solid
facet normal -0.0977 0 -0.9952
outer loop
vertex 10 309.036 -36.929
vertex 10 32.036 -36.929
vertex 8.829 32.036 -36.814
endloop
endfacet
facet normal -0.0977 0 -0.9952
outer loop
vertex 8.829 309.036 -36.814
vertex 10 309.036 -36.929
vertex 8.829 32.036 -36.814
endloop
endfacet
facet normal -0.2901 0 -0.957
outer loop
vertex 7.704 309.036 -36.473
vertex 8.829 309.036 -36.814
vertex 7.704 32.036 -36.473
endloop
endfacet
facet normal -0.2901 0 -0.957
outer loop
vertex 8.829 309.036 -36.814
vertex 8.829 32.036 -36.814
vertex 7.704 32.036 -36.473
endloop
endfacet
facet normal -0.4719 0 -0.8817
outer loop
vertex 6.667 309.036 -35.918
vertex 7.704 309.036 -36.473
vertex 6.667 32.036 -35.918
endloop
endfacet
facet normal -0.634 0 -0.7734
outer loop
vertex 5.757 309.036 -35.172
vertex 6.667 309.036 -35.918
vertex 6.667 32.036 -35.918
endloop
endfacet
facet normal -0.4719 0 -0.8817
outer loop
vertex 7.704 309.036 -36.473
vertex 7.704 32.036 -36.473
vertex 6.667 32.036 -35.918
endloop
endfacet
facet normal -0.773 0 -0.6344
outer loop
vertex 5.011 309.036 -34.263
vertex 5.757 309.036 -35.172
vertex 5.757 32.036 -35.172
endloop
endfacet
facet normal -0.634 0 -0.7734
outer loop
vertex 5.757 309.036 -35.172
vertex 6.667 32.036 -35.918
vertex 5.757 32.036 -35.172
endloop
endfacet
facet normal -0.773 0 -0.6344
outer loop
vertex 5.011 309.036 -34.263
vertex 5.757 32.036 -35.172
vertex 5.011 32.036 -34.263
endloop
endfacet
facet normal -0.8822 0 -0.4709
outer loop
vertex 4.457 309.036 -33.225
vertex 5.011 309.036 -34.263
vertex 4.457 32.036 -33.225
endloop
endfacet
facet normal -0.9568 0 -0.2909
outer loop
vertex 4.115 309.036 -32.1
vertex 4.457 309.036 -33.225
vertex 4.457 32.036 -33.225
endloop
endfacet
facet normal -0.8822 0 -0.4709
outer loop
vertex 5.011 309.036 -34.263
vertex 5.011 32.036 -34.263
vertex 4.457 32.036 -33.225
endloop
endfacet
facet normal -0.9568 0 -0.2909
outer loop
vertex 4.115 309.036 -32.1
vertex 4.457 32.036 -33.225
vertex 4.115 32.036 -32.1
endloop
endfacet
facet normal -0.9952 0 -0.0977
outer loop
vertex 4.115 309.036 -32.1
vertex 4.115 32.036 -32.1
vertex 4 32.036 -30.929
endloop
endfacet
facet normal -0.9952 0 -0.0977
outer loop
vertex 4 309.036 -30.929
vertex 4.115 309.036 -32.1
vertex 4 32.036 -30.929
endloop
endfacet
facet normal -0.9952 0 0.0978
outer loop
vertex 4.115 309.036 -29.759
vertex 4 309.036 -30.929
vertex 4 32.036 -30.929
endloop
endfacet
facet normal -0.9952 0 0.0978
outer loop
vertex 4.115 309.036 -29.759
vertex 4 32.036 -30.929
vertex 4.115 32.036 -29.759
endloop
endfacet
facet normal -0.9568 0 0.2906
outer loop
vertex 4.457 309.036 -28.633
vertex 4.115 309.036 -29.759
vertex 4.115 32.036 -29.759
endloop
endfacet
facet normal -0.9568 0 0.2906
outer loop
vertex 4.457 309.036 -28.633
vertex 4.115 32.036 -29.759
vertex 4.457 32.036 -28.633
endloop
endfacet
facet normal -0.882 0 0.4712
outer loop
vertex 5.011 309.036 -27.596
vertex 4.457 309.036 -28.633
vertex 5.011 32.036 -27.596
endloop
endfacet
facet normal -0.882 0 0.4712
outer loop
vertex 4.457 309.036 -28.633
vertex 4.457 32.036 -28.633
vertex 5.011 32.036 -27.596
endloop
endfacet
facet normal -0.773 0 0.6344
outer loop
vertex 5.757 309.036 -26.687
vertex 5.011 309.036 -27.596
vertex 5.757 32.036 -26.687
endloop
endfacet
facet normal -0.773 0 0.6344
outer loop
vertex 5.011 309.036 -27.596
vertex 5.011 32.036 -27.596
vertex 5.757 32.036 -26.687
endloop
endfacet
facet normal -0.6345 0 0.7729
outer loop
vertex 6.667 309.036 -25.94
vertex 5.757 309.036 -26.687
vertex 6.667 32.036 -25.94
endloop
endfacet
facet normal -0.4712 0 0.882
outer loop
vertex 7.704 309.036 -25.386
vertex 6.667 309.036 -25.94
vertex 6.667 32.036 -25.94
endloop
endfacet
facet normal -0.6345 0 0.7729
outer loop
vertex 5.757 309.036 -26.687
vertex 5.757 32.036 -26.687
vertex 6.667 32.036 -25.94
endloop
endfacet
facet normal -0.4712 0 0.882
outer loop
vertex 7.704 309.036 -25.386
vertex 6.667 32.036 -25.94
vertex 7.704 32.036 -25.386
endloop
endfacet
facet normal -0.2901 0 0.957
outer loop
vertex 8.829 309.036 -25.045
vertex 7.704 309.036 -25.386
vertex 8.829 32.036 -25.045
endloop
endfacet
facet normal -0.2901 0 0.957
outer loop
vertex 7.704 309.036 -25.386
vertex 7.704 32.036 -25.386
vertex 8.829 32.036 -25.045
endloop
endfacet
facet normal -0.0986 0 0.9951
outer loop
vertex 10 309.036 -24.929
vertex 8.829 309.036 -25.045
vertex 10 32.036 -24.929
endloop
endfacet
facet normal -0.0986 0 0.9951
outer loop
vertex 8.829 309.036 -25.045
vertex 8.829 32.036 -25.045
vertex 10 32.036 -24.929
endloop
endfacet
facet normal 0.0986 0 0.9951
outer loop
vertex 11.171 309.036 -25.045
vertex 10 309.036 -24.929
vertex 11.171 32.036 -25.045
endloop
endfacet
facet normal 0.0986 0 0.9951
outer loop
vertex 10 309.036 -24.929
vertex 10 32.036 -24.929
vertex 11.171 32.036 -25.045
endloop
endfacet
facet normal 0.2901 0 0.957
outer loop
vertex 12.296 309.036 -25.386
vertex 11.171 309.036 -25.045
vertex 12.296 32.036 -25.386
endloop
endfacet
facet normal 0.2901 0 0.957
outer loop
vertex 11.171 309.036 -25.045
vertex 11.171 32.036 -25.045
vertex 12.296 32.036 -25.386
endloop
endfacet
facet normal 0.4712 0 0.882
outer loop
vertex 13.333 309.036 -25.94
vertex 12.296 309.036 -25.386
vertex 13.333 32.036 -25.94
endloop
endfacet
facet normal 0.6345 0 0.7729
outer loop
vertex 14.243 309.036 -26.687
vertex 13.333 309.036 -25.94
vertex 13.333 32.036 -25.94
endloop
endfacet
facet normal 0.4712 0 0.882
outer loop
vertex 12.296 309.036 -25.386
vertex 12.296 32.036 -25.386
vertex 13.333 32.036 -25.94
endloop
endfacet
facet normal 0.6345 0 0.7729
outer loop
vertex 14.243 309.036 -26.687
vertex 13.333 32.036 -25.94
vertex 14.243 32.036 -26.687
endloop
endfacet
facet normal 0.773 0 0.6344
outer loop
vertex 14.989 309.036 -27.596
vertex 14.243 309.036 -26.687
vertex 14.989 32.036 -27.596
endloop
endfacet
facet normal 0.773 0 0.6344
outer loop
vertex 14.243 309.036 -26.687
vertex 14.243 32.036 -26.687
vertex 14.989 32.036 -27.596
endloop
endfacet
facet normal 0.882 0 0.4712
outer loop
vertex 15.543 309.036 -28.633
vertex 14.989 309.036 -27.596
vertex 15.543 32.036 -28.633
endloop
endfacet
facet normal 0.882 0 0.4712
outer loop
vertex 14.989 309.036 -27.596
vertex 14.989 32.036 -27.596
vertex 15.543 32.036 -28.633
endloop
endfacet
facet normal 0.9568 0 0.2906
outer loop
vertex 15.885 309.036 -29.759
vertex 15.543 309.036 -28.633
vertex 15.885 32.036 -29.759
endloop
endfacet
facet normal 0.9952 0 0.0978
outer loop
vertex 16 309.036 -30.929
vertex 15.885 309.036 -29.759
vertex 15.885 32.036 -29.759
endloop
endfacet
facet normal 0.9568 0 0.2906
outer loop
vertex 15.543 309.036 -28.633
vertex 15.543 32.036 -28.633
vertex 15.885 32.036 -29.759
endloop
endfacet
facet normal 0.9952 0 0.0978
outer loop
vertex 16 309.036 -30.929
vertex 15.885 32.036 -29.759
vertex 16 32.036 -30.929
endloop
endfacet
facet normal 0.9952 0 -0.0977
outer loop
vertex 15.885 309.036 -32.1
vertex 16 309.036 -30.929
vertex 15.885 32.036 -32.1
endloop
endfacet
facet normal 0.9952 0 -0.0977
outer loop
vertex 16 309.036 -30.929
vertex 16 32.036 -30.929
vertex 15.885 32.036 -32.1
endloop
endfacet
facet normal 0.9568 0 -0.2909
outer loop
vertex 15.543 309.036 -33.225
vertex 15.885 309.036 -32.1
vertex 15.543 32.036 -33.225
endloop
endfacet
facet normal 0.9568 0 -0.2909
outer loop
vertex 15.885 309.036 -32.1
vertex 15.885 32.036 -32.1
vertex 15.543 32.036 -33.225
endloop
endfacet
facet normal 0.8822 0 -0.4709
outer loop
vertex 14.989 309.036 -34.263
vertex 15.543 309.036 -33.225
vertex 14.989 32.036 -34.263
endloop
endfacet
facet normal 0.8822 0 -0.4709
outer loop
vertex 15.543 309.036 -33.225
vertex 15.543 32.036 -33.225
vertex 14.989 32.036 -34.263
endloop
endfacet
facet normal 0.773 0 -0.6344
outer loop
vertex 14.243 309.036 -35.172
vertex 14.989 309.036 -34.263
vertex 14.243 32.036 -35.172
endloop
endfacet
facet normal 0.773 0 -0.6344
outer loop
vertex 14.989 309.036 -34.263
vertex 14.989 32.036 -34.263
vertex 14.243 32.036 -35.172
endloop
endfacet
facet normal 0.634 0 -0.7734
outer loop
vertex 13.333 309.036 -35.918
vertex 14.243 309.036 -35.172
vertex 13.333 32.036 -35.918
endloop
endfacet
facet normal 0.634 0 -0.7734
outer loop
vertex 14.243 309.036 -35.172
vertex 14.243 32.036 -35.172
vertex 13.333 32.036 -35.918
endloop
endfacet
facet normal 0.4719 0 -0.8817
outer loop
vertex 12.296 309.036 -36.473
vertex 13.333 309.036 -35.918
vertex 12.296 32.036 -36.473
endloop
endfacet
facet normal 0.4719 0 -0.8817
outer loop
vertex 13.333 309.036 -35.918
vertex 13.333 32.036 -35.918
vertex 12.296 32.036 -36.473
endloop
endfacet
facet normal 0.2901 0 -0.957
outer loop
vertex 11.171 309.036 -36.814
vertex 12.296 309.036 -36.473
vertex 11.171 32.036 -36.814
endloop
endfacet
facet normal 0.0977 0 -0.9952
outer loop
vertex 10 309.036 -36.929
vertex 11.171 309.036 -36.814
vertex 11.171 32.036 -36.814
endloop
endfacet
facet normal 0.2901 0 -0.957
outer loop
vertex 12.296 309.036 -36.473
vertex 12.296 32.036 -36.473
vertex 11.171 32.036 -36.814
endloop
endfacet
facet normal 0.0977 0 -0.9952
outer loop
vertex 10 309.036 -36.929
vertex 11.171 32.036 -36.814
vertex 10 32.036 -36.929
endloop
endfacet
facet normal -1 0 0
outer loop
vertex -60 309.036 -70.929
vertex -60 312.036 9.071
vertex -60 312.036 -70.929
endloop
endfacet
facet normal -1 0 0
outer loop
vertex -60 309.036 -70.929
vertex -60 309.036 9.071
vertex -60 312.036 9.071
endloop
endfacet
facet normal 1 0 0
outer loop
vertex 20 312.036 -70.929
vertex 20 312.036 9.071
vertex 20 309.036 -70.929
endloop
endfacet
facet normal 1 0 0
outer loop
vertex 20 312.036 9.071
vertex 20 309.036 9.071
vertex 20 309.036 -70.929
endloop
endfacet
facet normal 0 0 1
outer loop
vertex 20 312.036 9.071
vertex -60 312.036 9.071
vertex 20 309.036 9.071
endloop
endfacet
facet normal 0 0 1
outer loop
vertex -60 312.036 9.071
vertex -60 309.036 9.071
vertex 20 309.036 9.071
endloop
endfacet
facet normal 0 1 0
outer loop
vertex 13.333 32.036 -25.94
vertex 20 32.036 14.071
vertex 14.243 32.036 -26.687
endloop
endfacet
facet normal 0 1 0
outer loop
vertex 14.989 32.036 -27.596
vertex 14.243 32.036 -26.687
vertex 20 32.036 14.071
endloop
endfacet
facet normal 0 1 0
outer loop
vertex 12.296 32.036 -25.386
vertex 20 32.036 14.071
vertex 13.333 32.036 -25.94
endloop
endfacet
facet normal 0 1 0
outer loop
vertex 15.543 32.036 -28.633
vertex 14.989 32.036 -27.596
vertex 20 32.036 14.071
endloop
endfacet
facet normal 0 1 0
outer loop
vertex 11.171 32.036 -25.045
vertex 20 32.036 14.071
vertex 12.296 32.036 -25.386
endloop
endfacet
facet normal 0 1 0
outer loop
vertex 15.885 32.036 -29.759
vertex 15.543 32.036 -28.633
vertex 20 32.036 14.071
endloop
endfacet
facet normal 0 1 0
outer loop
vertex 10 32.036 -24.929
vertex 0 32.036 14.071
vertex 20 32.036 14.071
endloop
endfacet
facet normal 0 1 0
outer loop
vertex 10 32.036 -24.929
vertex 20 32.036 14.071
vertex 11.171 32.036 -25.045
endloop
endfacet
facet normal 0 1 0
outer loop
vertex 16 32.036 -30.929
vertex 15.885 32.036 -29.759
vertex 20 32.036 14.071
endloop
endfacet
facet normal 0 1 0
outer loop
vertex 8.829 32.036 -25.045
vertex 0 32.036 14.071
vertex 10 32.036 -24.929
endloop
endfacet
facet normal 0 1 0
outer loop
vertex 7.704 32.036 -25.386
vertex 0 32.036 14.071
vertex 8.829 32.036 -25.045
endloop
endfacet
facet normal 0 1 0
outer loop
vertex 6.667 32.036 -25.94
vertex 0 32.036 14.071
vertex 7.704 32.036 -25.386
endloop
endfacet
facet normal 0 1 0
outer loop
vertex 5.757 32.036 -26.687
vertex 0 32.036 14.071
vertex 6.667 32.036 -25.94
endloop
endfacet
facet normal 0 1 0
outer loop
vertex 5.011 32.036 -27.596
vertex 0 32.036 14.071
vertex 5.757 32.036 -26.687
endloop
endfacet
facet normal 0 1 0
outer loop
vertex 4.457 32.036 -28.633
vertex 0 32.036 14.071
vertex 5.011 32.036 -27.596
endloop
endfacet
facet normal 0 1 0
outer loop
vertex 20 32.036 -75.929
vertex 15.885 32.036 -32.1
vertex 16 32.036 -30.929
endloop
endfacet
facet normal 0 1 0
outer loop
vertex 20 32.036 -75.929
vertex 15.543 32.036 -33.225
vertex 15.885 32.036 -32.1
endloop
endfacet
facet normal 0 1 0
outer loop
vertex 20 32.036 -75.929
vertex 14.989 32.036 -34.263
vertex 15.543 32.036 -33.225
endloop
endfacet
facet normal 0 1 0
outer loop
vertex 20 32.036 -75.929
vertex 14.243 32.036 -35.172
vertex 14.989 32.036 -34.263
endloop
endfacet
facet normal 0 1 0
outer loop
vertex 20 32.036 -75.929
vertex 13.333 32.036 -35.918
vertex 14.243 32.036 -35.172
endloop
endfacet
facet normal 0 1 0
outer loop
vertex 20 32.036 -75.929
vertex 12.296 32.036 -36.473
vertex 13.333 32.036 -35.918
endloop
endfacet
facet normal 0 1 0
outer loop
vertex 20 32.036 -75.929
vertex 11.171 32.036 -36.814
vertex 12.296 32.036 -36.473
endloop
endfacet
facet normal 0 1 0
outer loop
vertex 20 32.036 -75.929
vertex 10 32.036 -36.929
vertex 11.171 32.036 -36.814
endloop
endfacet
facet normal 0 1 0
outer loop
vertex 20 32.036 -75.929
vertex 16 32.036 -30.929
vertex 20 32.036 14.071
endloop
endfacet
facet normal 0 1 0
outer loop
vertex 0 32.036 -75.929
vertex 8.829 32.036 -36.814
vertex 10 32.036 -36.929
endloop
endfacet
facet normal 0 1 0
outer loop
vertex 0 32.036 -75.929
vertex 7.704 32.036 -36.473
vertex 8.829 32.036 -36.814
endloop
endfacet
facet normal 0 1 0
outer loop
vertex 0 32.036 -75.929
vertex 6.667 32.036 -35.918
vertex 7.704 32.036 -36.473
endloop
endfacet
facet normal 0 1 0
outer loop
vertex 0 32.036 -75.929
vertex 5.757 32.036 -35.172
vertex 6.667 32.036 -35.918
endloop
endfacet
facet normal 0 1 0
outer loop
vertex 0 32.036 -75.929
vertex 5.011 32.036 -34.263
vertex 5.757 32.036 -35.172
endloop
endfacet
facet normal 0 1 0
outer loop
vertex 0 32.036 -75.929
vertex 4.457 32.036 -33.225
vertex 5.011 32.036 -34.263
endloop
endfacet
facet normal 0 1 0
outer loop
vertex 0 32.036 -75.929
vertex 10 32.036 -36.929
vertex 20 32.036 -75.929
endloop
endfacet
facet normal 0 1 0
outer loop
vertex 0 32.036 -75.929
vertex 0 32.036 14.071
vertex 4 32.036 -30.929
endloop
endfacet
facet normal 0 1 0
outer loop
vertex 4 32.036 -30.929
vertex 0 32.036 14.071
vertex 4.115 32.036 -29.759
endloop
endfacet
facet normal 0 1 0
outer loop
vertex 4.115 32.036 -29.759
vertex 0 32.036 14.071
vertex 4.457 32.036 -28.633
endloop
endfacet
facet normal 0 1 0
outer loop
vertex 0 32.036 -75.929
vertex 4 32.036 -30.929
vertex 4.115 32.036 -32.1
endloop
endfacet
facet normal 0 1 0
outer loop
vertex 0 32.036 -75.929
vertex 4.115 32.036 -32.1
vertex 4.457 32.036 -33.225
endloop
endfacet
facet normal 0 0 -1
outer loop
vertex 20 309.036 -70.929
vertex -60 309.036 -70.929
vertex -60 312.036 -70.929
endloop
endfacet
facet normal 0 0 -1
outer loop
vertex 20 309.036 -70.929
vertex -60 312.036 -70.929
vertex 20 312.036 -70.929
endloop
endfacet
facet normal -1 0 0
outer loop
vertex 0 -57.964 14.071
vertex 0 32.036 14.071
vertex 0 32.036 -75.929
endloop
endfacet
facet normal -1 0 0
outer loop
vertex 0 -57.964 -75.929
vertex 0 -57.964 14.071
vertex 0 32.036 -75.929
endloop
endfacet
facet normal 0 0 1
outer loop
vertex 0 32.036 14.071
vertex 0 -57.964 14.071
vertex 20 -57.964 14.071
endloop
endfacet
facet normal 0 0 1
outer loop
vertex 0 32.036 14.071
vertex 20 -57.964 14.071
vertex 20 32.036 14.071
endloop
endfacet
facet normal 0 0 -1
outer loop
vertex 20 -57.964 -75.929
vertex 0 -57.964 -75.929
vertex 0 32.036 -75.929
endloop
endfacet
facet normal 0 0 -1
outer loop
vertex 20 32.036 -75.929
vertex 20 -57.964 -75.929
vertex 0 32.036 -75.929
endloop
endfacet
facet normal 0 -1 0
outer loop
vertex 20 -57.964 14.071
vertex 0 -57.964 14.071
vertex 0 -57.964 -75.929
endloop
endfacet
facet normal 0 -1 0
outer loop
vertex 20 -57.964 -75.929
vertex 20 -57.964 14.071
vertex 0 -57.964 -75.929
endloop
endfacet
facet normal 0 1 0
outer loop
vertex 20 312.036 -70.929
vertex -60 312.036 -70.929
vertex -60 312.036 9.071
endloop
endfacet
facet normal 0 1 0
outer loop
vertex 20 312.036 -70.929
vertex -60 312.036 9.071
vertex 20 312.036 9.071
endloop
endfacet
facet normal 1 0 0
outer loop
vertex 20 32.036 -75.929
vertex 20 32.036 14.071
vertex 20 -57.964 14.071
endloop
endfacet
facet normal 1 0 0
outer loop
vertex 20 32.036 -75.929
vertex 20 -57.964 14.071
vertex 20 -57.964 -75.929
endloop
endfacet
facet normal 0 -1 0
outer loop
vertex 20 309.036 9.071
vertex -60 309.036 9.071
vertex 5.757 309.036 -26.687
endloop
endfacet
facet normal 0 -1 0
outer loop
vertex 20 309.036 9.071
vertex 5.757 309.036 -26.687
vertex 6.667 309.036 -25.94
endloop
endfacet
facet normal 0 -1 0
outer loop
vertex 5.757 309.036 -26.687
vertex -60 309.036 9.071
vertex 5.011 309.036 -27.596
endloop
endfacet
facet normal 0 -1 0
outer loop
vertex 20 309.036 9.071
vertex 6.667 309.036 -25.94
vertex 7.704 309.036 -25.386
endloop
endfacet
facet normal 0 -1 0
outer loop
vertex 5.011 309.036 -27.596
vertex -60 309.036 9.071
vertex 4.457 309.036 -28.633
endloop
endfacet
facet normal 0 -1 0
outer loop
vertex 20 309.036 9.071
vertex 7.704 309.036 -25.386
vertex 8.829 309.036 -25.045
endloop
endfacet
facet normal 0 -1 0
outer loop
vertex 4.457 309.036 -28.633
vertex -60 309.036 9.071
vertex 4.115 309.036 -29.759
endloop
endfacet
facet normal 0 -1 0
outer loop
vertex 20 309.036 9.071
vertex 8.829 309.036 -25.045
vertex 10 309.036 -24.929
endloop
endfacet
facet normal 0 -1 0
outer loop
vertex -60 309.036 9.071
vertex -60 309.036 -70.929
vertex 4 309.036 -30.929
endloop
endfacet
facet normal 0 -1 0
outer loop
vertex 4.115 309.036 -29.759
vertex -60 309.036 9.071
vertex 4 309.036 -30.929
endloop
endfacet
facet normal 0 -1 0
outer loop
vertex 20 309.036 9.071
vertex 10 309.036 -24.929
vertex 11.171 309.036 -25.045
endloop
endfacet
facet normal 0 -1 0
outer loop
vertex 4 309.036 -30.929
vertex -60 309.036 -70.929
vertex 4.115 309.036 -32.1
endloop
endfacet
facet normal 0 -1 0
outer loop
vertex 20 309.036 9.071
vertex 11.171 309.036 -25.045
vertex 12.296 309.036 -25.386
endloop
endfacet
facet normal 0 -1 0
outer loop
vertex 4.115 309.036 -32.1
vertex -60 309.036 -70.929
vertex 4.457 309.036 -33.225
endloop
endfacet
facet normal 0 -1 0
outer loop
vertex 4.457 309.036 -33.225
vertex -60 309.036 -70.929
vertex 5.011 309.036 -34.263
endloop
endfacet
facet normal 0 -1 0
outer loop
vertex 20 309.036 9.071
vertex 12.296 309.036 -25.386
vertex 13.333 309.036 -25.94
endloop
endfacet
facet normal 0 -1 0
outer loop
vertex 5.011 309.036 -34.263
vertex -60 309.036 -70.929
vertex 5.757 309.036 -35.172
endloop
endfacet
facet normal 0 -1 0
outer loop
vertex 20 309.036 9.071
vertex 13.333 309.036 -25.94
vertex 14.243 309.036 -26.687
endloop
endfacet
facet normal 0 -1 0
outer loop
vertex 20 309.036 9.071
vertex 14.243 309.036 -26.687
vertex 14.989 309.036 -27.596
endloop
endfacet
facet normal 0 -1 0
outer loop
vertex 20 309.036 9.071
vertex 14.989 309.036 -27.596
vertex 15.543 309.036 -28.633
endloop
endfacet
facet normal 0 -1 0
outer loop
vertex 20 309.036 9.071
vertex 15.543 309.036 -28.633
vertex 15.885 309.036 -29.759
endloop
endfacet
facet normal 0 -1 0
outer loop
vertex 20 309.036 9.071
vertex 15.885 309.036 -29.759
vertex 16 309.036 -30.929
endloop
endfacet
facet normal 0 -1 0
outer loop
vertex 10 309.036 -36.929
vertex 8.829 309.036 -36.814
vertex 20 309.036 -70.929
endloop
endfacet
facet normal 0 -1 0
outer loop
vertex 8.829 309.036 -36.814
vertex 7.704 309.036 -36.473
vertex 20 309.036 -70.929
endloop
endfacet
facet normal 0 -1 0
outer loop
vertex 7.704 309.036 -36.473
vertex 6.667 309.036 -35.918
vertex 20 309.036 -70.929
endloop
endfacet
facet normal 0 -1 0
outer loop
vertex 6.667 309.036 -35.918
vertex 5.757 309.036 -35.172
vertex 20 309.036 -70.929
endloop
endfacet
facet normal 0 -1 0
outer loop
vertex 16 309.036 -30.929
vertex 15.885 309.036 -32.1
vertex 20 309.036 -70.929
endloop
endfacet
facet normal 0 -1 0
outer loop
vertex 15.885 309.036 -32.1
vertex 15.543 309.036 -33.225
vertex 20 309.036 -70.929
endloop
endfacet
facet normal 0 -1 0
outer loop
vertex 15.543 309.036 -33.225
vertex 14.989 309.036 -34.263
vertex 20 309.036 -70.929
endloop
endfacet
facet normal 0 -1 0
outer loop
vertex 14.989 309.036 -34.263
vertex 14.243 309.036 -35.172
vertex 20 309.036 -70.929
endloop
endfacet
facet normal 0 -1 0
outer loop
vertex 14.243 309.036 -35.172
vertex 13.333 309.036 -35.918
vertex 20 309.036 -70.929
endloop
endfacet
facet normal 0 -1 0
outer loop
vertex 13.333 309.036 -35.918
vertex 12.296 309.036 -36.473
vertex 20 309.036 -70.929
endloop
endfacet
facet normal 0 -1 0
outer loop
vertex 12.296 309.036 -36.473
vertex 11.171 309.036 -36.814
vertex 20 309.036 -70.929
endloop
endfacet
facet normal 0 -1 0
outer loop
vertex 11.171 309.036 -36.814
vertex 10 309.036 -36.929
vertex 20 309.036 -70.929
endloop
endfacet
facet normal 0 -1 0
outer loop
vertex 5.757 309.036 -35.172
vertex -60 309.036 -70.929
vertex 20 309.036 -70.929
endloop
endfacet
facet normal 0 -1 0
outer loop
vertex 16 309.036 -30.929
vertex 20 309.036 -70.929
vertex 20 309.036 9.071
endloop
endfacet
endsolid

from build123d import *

# Parameters (mm, degrees)
ESQUISSE1_W        = 90
ESQUISSE1_H        = 90
BOSS_EXTRU_1_DEPTH = 20
ESQUISSE2_R        = 6
BOSS_EXTRU_2_DEPTH = 277
ESQUISSE3_W        = 80
ESQUISSE3_H        = 80
BOSS_EXTRU_3_DEPTH = 2.9
ESQUISSE4_W        = 80
ESQUISSE4_H        = 80
BOSS_EXTRU_4_DEPTH = 0.1


with BuildPart() as part:
    # Esquisse1 → Boss.-Extru.1 (new body)
    with BuildSketch(Plane(origin=(0, 0, 0), x_dir=(0, 0, -1), z_dir=(1, 0, 0))):
        with Locations((30.929303344, -12.964038863)):
            Rectangle(ESQUISSE1_W, ESQUISSE1_H)
    extrude(amount=BOSS_EXTRU_1_DEPTH)

    # Esquisse2 → Boss.-Extru.2 (add)
    with BuildSketch(Plane(origin=(0, 32.035961137, 0), x_dir=(1, 0, 0), z_dir=(0, 1, 0))):
        with Locations(Location((10, 30.929303344, 0), (0, 0, 90))):
            Circle(ESQUISSE2_R)
    extrude(amount=BOSS_EXTRU_2_DEPTH)

    # Esquisse3 → Boss.-Extru.3 (add)
    with BuildSketch(Plane(origin=(0, 309.035961137, 0), x_dir=(1, 0, 0), z_dir=(0, 1, 0))):
        with Locations((-20, 30.929303344)):
            Rectangle(ESQUISSE3_W, ESQUISSE3_H)
    extrude(amount=BOSS_EXTRU_3_DEPTH)

    # Esquisse4 → Boss.-Extru.4 (add)
    with BuildSketch(Plane(origin=(0, 311.935961137, 0), x_dir=(1, 0, 0), z_dir=(0, 1, 0))):
        with Locations((-20, 30.929303344)):
            Rectangle(ESQUISSE4_W, ESQUISSE4_H)
    extrude(amount=BOSS_EXTRU_4_DEPTH)


solid = part.part
